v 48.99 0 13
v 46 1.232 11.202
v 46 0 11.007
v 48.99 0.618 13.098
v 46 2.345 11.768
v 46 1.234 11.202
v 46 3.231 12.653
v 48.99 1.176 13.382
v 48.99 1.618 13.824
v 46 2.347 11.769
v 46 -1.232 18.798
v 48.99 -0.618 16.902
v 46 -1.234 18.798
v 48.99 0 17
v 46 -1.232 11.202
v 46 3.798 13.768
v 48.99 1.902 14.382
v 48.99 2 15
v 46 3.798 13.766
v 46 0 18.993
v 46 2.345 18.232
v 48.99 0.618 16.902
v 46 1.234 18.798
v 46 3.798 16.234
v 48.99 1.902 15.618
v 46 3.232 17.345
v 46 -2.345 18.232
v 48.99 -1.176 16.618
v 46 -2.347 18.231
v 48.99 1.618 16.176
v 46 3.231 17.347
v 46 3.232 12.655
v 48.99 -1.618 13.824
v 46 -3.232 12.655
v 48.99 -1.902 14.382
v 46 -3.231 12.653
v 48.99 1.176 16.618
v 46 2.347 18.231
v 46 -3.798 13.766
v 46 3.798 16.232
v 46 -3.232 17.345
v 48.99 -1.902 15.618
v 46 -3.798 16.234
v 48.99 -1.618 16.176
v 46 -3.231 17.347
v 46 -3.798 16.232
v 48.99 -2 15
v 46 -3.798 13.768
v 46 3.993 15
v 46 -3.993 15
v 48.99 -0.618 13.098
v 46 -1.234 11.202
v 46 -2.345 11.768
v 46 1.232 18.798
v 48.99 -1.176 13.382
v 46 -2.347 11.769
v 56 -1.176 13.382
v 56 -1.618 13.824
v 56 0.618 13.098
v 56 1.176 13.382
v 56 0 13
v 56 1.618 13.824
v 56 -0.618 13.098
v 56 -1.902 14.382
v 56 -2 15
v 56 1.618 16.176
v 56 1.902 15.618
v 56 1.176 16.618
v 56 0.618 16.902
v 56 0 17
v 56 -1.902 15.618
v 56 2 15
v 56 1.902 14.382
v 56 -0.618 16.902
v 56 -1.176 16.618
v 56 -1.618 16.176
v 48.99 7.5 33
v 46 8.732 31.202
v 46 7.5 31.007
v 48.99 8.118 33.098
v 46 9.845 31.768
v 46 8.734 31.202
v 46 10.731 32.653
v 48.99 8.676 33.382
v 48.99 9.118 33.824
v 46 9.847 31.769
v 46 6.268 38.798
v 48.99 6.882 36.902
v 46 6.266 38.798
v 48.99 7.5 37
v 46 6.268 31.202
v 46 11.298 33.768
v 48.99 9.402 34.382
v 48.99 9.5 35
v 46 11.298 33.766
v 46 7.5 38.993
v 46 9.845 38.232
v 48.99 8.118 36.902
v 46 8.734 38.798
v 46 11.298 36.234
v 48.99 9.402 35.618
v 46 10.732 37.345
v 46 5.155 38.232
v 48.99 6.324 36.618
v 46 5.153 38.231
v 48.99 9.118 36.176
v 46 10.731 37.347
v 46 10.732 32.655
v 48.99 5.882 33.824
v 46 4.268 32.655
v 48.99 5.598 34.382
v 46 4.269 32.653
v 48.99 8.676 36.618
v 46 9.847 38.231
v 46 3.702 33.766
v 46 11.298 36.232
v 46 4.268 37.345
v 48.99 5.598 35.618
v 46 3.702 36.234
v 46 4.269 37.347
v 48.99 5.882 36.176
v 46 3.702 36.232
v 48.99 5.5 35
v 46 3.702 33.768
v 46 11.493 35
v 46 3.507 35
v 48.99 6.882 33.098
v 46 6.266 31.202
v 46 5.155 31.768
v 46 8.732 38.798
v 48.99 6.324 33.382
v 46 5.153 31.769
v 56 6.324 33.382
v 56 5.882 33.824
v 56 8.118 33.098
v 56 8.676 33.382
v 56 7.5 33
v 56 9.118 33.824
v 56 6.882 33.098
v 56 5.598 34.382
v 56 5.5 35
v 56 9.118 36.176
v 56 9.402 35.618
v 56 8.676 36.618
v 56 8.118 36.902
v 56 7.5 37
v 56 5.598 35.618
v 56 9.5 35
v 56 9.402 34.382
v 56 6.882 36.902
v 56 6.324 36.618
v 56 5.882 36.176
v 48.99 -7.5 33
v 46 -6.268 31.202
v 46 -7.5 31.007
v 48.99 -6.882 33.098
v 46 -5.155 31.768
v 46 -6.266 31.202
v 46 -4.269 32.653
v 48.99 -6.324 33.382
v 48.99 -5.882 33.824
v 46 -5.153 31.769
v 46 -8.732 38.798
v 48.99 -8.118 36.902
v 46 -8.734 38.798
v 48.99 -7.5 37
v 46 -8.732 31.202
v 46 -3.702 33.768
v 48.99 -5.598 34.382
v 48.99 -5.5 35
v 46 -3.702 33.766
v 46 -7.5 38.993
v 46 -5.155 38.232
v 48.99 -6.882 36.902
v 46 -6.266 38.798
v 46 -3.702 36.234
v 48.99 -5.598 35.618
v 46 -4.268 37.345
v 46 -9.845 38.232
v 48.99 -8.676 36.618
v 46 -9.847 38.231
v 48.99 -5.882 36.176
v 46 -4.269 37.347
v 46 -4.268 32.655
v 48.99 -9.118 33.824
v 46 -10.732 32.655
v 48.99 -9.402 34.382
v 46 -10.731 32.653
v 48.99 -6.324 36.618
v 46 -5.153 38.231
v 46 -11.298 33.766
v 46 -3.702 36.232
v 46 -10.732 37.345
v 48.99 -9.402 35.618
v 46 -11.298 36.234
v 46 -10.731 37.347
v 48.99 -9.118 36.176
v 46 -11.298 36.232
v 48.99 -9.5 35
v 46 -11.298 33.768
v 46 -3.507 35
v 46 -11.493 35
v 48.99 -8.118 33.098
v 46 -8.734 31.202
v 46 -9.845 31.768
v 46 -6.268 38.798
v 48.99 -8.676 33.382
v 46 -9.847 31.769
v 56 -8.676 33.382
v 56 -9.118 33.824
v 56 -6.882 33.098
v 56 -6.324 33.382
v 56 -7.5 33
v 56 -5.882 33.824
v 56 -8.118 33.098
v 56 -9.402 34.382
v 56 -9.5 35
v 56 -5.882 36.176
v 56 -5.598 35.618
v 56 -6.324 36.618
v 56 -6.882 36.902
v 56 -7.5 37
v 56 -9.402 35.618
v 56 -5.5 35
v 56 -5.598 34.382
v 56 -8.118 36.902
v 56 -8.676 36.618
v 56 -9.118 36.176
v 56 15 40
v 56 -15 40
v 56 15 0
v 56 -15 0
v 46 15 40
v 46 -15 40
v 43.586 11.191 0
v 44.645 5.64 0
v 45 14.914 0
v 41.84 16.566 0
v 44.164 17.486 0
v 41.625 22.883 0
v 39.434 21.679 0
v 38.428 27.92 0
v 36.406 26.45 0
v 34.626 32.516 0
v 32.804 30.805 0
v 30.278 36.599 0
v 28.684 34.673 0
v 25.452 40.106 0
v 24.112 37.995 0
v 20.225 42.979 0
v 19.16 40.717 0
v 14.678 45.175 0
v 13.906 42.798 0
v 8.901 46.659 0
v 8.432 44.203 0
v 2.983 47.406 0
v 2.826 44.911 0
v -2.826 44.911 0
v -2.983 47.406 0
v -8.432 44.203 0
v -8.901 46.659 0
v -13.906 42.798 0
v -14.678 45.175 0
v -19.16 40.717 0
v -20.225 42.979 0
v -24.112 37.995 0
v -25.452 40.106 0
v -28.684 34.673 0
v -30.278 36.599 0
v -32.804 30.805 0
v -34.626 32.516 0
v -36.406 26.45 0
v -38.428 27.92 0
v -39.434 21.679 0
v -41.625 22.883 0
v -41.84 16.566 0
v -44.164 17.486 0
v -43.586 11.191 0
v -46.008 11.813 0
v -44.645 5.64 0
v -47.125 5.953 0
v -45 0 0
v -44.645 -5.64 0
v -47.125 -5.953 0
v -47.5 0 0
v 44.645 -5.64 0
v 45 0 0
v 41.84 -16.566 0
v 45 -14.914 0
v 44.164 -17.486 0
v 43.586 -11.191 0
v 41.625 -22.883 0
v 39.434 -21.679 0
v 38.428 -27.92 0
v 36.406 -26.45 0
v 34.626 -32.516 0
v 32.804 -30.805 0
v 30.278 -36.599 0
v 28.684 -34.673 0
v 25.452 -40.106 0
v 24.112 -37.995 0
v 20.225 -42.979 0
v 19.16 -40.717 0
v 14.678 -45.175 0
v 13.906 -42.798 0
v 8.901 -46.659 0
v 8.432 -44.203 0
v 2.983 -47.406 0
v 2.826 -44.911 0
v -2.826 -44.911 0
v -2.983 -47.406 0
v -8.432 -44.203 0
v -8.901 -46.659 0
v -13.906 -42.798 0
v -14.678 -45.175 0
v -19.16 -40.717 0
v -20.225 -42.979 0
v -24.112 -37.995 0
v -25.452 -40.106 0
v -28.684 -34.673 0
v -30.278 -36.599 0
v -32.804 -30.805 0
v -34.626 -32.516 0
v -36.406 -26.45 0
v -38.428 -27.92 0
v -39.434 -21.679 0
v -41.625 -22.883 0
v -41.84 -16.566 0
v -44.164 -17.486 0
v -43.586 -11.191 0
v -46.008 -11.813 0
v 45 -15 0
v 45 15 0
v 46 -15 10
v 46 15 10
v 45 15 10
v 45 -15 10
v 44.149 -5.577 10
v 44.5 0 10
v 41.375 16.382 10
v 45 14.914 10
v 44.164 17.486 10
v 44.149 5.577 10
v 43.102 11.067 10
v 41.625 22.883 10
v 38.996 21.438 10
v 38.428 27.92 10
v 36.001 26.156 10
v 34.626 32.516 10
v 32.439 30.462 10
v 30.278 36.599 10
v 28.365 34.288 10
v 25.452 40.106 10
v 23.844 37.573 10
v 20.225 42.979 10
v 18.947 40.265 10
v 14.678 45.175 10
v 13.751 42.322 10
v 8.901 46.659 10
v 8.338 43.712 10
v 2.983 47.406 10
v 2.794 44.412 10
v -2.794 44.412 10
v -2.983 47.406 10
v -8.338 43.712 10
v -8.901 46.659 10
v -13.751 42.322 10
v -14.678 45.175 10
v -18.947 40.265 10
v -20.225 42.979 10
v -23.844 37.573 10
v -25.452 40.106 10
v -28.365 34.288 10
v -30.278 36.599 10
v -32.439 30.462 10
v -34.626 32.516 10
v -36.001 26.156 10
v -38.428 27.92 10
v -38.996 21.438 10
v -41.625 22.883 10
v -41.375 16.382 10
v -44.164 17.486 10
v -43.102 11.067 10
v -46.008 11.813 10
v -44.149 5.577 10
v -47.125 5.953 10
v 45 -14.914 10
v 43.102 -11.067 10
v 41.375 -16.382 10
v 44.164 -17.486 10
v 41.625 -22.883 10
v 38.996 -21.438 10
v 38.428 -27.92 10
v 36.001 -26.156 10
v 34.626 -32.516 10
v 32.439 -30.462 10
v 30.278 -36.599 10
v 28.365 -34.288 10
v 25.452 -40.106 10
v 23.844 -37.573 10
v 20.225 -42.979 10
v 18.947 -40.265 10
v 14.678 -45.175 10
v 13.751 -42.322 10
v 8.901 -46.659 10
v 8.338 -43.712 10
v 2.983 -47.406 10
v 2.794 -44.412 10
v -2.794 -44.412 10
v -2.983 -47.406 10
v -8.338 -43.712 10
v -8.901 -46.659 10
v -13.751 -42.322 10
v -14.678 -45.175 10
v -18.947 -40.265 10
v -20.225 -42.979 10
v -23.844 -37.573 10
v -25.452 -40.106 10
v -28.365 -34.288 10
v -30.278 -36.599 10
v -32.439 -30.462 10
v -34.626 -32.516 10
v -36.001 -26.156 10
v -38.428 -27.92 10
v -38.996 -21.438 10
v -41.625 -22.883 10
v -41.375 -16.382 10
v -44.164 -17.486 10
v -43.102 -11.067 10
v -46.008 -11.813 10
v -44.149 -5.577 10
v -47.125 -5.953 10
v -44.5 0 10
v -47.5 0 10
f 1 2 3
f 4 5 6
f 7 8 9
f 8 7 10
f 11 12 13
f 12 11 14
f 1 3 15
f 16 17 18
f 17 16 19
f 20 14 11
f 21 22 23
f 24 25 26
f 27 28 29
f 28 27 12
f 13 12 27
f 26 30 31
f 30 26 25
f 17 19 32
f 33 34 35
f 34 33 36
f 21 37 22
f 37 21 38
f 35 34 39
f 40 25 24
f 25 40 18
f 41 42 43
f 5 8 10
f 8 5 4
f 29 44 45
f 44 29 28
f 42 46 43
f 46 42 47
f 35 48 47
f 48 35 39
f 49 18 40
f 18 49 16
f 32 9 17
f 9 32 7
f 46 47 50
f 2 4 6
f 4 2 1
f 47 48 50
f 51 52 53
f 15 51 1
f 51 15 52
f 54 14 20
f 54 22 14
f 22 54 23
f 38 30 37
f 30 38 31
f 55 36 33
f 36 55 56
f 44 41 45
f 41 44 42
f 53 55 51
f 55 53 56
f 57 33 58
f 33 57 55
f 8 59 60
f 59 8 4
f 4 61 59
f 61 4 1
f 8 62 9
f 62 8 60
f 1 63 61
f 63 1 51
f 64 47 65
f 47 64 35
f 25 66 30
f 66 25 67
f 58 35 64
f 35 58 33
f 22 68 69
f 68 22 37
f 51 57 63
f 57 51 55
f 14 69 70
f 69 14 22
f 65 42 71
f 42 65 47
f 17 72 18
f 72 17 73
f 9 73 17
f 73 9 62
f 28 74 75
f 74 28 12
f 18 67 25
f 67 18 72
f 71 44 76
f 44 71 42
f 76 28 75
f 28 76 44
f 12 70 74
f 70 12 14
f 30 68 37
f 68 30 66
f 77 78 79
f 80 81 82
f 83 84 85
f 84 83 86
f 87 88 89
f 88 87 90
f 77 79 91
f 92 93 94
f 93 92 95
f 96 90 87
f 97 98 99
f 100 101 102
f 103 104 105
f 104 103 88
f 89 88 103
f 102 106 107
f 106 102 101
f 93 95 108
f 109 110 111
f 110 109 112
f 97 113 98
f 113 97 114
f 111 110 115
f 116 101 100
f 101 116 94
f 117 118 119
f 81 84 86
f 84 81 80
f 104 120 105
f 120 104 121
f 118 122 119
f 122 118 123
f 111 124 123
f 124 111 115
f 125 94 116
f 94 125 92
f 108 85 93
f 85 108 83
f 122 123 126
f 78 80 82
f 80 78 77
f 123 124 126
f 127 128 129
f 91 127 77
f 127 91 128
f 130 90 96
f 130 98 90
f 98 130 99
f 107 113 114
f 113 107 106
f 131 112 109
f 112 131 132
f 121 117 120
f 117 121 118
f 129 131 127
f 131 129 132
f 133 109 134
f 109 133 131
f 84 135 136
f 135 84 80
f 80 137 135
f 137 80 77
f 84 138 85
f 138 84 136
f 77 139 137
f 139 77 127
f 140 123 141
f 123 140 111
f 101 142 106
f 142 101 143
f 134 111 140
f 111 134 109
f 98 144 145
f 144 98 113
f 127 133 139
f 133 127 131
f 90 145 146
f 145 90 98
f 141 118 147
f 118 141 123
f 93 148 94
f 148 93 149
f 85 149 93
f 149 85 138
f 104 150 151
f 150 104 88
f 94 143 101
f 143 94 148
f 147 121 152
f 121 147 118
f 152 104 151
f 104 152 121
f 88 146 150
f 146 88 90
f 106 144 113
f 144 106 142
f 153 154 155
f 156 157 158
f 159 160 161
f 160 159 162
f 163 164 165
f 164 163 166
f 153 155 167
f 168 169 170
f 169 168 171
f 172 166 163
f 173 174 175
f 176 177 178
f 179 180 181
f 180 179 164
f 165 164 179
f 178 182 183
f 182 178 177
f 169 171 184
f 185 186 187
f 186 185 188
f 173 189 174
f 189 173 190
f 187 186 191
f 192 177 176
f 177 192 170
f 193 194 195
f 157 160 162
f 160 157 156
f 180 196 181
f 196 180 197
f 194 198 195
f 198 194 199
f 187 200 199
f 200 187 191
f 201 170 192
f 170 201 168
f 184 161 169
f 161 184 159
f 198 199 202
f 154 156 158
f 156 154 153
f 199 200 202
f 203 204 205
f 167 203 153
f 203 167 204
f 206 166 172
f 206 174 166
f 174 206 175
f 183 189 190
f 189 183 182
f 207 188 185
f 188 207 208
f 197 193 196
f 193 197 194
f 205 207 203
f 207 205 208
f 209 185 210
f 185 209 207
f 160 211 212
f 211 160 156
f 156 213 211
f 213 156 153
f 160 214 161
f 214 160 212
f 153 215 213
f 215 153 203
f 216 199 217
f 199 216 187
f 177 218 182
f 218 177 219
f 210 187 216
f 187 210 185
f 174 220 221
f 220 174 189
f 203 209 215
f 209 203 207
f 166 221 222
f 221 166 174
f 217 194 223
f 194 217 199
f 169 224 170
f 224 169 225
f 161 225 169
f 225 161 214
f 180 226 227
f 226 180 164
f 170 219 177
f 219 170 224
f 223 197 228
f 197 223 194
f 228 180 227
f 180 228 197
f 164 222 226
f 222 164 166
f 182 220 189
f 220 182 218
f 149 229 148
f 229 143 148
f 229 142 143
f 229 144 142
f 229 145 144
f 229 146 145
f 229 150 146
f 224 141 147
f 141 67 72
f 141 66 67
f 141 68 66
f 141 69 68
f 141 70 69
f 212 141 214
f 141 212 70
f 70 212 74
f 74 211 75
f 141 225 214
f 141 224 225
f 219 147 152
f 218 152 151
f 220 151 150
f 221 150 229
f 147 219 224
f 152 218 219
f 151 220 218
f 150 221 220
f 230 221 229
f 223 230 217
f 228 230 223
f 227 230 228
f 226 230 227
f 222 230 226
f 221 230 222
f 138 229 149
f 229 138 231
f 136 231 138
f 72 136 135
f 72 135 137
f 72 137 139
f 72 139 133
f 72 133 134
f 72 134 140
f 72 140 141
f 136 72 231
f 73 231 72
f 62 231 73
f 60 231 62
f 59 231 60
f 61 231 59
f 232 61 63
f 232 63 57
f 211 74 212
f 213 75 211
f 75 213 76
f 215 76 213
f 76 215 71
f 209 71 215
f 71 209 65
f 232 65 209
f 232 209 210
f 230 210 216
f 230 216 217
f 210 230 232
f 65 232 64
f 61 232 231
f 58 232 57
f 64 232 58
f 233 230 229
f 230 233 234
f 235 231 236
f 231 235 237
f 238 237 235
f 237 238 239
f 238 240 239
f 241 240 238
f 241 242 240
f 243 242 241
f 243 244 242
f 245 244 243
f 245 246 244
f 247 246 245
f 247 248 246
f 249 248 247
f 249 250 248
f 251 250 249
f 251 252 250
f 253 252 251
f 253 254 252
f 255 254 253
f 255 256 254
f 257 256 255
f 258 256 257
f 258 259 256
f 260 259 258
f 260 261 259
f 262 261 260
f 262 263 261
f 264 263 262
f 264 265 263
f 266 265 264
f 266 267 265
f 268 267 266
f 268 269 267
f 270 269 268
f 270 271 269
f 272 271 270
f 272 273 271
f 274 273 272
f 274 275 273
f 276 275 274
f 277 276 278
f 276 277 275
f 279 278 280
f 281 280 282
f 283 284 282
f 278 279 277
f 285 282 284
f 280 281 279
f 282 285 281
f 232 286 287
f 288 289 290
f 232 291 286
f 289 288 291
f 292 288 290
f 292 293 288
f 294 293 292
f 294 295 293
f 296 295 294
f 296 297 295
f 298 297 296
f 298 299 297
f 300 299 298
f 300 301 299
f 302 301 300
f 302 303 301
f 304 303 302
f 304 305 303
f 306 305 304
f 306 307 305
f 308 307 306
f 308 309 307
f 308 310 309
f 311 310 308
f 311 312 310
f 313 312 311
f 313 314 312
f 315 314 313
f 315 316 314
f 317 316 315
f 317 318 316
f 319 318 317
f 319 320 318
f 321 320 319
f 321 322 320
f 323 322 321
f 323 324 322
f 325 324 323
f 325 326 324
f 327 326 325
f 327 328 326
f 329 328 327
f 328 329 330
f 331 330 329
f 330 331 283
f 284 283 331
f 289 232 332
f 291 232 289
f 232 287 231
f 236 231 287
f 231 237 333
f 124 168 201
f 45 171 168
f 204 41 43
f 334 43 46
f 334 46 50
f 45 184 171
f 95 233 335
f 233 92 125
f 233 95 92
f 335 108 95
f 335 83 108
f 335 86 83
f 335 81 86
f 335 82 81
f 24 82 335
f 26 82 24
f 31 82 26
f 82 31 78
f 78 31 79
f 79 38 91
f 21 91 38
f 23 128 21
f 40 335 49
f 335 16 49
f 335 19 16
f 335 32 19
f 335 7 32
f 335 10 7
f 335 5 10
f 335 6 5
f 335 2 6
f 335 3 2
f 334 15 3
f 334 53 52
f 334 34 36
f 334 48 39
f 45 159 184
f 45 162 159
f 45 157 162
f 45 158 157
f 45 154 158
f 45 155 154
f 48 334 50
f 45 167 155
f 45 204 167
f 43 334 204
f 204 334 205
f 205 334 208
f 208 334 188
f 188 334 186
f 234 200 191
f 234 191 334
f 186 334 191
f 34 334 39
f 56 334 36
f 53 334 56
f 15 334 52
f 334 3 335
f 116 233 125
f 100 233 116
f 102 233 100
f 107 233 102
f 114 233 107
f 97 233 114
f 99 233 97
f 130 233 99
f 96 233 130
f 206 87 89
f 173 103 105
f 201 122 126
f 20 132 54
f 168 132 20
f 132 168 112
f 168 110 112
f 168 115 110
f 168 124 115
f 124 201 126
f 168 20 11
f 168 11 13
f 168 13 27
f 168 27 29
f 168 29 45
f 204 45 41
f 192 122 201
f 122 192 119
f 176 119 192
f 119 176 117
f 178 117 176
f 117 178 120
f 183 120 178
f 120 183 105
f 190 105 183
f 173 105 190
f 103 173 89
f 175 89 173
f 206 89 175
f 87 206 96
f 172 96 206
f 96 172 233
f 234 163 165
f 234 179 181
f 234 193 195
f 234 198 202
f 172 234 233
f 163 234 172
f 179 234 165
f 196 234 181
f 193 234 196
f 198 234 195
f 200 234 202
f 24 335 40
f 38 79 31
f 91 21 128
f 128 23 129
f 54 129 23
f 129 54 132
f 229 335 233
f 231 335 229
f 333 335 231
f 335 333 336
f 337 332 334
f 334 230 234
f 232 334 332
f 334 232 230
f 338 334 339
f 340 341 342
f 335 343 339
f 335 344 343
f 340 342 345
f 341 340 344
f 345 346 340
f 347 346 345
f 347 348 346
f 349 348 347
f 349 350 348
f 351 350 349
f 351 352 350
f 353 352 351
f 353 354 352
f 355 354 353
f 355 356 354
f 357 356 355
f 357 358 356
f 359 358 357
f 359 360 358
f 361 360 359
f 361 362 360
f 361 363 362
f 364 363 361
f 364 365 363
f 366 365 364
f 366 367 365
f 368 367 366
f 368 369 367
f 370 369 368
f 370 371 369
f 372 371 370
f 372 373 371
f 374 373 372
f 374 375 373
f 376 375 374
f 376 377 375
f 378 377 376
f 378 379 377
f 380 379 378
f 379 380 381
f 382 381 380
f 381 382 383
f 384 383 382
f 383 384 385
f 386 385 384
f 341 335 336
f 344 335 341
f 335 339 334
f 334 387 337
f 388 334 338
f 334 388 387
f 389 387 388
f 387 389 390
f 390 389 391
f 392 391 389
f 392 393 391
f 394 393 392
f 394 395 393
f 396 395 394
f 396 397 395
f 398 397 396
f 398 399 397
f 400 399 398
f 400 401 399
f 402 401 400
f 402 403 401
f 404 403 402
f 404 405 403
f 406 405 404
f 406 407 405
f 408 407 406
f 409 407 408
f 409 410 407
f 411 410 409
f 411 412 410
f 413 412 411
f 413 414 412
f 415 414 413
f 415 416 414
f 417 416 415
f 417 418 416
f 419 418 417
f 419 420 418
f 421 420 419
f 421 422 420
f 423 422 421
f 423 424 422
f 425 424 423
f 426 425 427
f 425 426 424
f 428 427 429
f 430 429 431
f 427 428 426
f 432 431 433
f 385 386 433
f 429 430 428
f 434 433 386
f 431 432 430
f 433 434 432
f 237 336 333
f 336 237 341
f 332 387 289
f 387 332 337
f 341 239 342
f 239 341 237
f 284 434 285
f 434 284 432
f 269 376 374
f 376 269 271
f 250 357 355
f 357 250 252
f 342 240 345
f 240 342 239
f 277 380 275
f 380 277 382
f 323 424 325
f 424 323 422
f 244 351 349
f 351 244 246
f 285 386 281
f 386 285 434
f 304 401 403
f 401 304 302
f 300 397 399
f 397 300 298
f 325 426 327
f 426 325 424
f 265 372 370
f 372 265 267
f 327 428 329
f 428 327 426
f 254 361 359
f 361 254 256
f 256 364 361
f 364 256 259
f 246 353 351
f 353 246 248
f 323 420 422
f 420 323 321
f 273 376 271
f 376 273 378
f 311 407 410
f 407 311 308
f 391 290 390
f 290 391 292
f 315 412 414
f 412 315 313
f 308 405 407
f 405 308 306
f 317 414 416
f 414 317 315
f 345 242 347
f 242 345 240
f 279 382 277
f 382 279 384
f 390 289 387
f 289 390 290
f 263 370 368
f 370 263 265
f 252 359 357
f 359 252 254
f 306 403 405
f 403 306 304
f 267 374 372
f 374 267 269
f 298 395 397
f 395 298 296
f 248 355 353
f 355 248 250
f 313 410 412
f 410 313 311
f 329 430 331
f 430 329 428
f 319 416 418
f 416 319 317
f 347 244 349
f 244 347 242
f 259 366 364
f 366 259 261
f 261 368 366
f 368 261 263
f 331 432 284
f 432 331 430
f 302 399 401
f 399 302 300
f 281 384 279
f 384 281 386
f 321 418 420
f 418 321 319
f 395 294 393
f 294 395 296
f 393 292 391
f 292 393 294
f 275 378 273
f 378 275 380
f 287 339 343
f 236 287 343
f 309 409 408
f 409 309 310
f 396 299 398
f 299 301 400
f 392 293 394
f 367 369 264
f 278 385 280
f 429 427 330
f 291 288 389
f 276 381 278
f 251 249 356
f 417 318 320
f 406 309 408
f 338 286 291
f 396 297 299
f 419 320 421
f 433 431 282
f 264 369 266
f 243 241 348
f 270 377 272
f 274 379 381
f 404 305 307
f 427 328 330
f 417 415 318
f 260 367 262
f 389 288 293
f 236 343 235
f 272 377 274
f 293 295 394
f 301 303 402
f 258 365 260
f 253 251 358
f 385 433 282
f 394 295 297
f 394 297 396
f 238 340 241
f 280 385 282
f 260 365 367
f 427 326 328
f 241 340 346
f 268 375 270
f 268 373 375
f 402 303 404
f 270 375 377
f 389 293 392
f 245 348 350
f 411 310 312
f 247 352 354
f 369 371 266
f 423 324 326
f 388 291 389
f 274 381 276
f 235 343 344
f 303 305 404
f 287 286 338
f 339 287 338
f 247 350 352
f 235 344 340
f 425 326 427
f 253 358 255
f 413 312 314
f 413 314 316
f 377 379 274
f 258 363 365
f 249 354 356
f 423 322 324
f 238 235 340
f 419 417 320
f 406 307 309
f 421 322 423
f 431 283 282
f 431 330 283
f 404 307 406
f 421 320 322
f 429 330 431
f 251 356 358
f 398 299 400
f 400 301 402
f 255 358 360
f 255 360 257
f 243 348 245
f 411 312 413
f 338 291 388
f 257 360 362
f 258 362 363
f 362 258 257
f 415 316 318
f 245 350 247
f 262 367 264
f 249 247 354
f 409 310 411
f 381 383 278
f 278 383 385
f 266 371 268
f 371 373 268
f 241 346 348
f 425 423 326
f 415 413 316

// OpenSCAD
// Cup holder
$fn = 50;
cup_d1 = 90;
cup_d2 = 89;
cup_h = 10;
cup_w = 5;

mount_x = 10;
mount_y = 30;
mount_z = 40;
mount_x_offset = 6;

module screw_countersunk(
        l=20,   //length
        dh = 8,   //head dia
        lh = 3,   //head length
        ds = 4,  //shaft dia
        $fn=20,
        )
{
    union() {
        cylinder(h=lh, r1=dh/2, r2=ds/2);
        cylinder(h=l, d=ds);
    }
}

module outer_cup_mount() {
  outer_d = cup_d1 + cup_w;
  cylinder(d=outer_d, h=cup_h);
    
}

module inner_cup_mount() {
    cylinder(d1=cup_d1, d2=cup_d2, h=cup_h);
}
    
module wall_mount() {
    difference() {
    cube([mount_x, mount_y, mount_z], center=true);
    translate([-0.5*mount_x-0.01, 0, -0.5*mount_z + cup_h + 5]) rotate([0, 90, 0]) screw_countersunk();
    translate([-0.5*mount_x-0.01, 0.25*mount_y, 0.5*mount_z - 5]) rotate([0, 90, 0]) screw_countersunk();
    translate([-0.5*mount_x-0.01, -0.25*mount_y, 0.5*mount_z - 5]) rotate([0, 90, 0]) screw_countersunk();
    }
    translate([-0.5*mount_x_offset, 0, -0.5*(mount_z-cup_h)]) cube([mount_x_offset, mount_y, cup_h], center=true);
}

module solid_mount() {
outer_cup_mount();
translate([0.5*cup_d1 + mount_x_offset, 0, 0.5*mount_z]) wall_mount();
}

difference() {
    solid_mount();
    inner_cup_mount();
}
